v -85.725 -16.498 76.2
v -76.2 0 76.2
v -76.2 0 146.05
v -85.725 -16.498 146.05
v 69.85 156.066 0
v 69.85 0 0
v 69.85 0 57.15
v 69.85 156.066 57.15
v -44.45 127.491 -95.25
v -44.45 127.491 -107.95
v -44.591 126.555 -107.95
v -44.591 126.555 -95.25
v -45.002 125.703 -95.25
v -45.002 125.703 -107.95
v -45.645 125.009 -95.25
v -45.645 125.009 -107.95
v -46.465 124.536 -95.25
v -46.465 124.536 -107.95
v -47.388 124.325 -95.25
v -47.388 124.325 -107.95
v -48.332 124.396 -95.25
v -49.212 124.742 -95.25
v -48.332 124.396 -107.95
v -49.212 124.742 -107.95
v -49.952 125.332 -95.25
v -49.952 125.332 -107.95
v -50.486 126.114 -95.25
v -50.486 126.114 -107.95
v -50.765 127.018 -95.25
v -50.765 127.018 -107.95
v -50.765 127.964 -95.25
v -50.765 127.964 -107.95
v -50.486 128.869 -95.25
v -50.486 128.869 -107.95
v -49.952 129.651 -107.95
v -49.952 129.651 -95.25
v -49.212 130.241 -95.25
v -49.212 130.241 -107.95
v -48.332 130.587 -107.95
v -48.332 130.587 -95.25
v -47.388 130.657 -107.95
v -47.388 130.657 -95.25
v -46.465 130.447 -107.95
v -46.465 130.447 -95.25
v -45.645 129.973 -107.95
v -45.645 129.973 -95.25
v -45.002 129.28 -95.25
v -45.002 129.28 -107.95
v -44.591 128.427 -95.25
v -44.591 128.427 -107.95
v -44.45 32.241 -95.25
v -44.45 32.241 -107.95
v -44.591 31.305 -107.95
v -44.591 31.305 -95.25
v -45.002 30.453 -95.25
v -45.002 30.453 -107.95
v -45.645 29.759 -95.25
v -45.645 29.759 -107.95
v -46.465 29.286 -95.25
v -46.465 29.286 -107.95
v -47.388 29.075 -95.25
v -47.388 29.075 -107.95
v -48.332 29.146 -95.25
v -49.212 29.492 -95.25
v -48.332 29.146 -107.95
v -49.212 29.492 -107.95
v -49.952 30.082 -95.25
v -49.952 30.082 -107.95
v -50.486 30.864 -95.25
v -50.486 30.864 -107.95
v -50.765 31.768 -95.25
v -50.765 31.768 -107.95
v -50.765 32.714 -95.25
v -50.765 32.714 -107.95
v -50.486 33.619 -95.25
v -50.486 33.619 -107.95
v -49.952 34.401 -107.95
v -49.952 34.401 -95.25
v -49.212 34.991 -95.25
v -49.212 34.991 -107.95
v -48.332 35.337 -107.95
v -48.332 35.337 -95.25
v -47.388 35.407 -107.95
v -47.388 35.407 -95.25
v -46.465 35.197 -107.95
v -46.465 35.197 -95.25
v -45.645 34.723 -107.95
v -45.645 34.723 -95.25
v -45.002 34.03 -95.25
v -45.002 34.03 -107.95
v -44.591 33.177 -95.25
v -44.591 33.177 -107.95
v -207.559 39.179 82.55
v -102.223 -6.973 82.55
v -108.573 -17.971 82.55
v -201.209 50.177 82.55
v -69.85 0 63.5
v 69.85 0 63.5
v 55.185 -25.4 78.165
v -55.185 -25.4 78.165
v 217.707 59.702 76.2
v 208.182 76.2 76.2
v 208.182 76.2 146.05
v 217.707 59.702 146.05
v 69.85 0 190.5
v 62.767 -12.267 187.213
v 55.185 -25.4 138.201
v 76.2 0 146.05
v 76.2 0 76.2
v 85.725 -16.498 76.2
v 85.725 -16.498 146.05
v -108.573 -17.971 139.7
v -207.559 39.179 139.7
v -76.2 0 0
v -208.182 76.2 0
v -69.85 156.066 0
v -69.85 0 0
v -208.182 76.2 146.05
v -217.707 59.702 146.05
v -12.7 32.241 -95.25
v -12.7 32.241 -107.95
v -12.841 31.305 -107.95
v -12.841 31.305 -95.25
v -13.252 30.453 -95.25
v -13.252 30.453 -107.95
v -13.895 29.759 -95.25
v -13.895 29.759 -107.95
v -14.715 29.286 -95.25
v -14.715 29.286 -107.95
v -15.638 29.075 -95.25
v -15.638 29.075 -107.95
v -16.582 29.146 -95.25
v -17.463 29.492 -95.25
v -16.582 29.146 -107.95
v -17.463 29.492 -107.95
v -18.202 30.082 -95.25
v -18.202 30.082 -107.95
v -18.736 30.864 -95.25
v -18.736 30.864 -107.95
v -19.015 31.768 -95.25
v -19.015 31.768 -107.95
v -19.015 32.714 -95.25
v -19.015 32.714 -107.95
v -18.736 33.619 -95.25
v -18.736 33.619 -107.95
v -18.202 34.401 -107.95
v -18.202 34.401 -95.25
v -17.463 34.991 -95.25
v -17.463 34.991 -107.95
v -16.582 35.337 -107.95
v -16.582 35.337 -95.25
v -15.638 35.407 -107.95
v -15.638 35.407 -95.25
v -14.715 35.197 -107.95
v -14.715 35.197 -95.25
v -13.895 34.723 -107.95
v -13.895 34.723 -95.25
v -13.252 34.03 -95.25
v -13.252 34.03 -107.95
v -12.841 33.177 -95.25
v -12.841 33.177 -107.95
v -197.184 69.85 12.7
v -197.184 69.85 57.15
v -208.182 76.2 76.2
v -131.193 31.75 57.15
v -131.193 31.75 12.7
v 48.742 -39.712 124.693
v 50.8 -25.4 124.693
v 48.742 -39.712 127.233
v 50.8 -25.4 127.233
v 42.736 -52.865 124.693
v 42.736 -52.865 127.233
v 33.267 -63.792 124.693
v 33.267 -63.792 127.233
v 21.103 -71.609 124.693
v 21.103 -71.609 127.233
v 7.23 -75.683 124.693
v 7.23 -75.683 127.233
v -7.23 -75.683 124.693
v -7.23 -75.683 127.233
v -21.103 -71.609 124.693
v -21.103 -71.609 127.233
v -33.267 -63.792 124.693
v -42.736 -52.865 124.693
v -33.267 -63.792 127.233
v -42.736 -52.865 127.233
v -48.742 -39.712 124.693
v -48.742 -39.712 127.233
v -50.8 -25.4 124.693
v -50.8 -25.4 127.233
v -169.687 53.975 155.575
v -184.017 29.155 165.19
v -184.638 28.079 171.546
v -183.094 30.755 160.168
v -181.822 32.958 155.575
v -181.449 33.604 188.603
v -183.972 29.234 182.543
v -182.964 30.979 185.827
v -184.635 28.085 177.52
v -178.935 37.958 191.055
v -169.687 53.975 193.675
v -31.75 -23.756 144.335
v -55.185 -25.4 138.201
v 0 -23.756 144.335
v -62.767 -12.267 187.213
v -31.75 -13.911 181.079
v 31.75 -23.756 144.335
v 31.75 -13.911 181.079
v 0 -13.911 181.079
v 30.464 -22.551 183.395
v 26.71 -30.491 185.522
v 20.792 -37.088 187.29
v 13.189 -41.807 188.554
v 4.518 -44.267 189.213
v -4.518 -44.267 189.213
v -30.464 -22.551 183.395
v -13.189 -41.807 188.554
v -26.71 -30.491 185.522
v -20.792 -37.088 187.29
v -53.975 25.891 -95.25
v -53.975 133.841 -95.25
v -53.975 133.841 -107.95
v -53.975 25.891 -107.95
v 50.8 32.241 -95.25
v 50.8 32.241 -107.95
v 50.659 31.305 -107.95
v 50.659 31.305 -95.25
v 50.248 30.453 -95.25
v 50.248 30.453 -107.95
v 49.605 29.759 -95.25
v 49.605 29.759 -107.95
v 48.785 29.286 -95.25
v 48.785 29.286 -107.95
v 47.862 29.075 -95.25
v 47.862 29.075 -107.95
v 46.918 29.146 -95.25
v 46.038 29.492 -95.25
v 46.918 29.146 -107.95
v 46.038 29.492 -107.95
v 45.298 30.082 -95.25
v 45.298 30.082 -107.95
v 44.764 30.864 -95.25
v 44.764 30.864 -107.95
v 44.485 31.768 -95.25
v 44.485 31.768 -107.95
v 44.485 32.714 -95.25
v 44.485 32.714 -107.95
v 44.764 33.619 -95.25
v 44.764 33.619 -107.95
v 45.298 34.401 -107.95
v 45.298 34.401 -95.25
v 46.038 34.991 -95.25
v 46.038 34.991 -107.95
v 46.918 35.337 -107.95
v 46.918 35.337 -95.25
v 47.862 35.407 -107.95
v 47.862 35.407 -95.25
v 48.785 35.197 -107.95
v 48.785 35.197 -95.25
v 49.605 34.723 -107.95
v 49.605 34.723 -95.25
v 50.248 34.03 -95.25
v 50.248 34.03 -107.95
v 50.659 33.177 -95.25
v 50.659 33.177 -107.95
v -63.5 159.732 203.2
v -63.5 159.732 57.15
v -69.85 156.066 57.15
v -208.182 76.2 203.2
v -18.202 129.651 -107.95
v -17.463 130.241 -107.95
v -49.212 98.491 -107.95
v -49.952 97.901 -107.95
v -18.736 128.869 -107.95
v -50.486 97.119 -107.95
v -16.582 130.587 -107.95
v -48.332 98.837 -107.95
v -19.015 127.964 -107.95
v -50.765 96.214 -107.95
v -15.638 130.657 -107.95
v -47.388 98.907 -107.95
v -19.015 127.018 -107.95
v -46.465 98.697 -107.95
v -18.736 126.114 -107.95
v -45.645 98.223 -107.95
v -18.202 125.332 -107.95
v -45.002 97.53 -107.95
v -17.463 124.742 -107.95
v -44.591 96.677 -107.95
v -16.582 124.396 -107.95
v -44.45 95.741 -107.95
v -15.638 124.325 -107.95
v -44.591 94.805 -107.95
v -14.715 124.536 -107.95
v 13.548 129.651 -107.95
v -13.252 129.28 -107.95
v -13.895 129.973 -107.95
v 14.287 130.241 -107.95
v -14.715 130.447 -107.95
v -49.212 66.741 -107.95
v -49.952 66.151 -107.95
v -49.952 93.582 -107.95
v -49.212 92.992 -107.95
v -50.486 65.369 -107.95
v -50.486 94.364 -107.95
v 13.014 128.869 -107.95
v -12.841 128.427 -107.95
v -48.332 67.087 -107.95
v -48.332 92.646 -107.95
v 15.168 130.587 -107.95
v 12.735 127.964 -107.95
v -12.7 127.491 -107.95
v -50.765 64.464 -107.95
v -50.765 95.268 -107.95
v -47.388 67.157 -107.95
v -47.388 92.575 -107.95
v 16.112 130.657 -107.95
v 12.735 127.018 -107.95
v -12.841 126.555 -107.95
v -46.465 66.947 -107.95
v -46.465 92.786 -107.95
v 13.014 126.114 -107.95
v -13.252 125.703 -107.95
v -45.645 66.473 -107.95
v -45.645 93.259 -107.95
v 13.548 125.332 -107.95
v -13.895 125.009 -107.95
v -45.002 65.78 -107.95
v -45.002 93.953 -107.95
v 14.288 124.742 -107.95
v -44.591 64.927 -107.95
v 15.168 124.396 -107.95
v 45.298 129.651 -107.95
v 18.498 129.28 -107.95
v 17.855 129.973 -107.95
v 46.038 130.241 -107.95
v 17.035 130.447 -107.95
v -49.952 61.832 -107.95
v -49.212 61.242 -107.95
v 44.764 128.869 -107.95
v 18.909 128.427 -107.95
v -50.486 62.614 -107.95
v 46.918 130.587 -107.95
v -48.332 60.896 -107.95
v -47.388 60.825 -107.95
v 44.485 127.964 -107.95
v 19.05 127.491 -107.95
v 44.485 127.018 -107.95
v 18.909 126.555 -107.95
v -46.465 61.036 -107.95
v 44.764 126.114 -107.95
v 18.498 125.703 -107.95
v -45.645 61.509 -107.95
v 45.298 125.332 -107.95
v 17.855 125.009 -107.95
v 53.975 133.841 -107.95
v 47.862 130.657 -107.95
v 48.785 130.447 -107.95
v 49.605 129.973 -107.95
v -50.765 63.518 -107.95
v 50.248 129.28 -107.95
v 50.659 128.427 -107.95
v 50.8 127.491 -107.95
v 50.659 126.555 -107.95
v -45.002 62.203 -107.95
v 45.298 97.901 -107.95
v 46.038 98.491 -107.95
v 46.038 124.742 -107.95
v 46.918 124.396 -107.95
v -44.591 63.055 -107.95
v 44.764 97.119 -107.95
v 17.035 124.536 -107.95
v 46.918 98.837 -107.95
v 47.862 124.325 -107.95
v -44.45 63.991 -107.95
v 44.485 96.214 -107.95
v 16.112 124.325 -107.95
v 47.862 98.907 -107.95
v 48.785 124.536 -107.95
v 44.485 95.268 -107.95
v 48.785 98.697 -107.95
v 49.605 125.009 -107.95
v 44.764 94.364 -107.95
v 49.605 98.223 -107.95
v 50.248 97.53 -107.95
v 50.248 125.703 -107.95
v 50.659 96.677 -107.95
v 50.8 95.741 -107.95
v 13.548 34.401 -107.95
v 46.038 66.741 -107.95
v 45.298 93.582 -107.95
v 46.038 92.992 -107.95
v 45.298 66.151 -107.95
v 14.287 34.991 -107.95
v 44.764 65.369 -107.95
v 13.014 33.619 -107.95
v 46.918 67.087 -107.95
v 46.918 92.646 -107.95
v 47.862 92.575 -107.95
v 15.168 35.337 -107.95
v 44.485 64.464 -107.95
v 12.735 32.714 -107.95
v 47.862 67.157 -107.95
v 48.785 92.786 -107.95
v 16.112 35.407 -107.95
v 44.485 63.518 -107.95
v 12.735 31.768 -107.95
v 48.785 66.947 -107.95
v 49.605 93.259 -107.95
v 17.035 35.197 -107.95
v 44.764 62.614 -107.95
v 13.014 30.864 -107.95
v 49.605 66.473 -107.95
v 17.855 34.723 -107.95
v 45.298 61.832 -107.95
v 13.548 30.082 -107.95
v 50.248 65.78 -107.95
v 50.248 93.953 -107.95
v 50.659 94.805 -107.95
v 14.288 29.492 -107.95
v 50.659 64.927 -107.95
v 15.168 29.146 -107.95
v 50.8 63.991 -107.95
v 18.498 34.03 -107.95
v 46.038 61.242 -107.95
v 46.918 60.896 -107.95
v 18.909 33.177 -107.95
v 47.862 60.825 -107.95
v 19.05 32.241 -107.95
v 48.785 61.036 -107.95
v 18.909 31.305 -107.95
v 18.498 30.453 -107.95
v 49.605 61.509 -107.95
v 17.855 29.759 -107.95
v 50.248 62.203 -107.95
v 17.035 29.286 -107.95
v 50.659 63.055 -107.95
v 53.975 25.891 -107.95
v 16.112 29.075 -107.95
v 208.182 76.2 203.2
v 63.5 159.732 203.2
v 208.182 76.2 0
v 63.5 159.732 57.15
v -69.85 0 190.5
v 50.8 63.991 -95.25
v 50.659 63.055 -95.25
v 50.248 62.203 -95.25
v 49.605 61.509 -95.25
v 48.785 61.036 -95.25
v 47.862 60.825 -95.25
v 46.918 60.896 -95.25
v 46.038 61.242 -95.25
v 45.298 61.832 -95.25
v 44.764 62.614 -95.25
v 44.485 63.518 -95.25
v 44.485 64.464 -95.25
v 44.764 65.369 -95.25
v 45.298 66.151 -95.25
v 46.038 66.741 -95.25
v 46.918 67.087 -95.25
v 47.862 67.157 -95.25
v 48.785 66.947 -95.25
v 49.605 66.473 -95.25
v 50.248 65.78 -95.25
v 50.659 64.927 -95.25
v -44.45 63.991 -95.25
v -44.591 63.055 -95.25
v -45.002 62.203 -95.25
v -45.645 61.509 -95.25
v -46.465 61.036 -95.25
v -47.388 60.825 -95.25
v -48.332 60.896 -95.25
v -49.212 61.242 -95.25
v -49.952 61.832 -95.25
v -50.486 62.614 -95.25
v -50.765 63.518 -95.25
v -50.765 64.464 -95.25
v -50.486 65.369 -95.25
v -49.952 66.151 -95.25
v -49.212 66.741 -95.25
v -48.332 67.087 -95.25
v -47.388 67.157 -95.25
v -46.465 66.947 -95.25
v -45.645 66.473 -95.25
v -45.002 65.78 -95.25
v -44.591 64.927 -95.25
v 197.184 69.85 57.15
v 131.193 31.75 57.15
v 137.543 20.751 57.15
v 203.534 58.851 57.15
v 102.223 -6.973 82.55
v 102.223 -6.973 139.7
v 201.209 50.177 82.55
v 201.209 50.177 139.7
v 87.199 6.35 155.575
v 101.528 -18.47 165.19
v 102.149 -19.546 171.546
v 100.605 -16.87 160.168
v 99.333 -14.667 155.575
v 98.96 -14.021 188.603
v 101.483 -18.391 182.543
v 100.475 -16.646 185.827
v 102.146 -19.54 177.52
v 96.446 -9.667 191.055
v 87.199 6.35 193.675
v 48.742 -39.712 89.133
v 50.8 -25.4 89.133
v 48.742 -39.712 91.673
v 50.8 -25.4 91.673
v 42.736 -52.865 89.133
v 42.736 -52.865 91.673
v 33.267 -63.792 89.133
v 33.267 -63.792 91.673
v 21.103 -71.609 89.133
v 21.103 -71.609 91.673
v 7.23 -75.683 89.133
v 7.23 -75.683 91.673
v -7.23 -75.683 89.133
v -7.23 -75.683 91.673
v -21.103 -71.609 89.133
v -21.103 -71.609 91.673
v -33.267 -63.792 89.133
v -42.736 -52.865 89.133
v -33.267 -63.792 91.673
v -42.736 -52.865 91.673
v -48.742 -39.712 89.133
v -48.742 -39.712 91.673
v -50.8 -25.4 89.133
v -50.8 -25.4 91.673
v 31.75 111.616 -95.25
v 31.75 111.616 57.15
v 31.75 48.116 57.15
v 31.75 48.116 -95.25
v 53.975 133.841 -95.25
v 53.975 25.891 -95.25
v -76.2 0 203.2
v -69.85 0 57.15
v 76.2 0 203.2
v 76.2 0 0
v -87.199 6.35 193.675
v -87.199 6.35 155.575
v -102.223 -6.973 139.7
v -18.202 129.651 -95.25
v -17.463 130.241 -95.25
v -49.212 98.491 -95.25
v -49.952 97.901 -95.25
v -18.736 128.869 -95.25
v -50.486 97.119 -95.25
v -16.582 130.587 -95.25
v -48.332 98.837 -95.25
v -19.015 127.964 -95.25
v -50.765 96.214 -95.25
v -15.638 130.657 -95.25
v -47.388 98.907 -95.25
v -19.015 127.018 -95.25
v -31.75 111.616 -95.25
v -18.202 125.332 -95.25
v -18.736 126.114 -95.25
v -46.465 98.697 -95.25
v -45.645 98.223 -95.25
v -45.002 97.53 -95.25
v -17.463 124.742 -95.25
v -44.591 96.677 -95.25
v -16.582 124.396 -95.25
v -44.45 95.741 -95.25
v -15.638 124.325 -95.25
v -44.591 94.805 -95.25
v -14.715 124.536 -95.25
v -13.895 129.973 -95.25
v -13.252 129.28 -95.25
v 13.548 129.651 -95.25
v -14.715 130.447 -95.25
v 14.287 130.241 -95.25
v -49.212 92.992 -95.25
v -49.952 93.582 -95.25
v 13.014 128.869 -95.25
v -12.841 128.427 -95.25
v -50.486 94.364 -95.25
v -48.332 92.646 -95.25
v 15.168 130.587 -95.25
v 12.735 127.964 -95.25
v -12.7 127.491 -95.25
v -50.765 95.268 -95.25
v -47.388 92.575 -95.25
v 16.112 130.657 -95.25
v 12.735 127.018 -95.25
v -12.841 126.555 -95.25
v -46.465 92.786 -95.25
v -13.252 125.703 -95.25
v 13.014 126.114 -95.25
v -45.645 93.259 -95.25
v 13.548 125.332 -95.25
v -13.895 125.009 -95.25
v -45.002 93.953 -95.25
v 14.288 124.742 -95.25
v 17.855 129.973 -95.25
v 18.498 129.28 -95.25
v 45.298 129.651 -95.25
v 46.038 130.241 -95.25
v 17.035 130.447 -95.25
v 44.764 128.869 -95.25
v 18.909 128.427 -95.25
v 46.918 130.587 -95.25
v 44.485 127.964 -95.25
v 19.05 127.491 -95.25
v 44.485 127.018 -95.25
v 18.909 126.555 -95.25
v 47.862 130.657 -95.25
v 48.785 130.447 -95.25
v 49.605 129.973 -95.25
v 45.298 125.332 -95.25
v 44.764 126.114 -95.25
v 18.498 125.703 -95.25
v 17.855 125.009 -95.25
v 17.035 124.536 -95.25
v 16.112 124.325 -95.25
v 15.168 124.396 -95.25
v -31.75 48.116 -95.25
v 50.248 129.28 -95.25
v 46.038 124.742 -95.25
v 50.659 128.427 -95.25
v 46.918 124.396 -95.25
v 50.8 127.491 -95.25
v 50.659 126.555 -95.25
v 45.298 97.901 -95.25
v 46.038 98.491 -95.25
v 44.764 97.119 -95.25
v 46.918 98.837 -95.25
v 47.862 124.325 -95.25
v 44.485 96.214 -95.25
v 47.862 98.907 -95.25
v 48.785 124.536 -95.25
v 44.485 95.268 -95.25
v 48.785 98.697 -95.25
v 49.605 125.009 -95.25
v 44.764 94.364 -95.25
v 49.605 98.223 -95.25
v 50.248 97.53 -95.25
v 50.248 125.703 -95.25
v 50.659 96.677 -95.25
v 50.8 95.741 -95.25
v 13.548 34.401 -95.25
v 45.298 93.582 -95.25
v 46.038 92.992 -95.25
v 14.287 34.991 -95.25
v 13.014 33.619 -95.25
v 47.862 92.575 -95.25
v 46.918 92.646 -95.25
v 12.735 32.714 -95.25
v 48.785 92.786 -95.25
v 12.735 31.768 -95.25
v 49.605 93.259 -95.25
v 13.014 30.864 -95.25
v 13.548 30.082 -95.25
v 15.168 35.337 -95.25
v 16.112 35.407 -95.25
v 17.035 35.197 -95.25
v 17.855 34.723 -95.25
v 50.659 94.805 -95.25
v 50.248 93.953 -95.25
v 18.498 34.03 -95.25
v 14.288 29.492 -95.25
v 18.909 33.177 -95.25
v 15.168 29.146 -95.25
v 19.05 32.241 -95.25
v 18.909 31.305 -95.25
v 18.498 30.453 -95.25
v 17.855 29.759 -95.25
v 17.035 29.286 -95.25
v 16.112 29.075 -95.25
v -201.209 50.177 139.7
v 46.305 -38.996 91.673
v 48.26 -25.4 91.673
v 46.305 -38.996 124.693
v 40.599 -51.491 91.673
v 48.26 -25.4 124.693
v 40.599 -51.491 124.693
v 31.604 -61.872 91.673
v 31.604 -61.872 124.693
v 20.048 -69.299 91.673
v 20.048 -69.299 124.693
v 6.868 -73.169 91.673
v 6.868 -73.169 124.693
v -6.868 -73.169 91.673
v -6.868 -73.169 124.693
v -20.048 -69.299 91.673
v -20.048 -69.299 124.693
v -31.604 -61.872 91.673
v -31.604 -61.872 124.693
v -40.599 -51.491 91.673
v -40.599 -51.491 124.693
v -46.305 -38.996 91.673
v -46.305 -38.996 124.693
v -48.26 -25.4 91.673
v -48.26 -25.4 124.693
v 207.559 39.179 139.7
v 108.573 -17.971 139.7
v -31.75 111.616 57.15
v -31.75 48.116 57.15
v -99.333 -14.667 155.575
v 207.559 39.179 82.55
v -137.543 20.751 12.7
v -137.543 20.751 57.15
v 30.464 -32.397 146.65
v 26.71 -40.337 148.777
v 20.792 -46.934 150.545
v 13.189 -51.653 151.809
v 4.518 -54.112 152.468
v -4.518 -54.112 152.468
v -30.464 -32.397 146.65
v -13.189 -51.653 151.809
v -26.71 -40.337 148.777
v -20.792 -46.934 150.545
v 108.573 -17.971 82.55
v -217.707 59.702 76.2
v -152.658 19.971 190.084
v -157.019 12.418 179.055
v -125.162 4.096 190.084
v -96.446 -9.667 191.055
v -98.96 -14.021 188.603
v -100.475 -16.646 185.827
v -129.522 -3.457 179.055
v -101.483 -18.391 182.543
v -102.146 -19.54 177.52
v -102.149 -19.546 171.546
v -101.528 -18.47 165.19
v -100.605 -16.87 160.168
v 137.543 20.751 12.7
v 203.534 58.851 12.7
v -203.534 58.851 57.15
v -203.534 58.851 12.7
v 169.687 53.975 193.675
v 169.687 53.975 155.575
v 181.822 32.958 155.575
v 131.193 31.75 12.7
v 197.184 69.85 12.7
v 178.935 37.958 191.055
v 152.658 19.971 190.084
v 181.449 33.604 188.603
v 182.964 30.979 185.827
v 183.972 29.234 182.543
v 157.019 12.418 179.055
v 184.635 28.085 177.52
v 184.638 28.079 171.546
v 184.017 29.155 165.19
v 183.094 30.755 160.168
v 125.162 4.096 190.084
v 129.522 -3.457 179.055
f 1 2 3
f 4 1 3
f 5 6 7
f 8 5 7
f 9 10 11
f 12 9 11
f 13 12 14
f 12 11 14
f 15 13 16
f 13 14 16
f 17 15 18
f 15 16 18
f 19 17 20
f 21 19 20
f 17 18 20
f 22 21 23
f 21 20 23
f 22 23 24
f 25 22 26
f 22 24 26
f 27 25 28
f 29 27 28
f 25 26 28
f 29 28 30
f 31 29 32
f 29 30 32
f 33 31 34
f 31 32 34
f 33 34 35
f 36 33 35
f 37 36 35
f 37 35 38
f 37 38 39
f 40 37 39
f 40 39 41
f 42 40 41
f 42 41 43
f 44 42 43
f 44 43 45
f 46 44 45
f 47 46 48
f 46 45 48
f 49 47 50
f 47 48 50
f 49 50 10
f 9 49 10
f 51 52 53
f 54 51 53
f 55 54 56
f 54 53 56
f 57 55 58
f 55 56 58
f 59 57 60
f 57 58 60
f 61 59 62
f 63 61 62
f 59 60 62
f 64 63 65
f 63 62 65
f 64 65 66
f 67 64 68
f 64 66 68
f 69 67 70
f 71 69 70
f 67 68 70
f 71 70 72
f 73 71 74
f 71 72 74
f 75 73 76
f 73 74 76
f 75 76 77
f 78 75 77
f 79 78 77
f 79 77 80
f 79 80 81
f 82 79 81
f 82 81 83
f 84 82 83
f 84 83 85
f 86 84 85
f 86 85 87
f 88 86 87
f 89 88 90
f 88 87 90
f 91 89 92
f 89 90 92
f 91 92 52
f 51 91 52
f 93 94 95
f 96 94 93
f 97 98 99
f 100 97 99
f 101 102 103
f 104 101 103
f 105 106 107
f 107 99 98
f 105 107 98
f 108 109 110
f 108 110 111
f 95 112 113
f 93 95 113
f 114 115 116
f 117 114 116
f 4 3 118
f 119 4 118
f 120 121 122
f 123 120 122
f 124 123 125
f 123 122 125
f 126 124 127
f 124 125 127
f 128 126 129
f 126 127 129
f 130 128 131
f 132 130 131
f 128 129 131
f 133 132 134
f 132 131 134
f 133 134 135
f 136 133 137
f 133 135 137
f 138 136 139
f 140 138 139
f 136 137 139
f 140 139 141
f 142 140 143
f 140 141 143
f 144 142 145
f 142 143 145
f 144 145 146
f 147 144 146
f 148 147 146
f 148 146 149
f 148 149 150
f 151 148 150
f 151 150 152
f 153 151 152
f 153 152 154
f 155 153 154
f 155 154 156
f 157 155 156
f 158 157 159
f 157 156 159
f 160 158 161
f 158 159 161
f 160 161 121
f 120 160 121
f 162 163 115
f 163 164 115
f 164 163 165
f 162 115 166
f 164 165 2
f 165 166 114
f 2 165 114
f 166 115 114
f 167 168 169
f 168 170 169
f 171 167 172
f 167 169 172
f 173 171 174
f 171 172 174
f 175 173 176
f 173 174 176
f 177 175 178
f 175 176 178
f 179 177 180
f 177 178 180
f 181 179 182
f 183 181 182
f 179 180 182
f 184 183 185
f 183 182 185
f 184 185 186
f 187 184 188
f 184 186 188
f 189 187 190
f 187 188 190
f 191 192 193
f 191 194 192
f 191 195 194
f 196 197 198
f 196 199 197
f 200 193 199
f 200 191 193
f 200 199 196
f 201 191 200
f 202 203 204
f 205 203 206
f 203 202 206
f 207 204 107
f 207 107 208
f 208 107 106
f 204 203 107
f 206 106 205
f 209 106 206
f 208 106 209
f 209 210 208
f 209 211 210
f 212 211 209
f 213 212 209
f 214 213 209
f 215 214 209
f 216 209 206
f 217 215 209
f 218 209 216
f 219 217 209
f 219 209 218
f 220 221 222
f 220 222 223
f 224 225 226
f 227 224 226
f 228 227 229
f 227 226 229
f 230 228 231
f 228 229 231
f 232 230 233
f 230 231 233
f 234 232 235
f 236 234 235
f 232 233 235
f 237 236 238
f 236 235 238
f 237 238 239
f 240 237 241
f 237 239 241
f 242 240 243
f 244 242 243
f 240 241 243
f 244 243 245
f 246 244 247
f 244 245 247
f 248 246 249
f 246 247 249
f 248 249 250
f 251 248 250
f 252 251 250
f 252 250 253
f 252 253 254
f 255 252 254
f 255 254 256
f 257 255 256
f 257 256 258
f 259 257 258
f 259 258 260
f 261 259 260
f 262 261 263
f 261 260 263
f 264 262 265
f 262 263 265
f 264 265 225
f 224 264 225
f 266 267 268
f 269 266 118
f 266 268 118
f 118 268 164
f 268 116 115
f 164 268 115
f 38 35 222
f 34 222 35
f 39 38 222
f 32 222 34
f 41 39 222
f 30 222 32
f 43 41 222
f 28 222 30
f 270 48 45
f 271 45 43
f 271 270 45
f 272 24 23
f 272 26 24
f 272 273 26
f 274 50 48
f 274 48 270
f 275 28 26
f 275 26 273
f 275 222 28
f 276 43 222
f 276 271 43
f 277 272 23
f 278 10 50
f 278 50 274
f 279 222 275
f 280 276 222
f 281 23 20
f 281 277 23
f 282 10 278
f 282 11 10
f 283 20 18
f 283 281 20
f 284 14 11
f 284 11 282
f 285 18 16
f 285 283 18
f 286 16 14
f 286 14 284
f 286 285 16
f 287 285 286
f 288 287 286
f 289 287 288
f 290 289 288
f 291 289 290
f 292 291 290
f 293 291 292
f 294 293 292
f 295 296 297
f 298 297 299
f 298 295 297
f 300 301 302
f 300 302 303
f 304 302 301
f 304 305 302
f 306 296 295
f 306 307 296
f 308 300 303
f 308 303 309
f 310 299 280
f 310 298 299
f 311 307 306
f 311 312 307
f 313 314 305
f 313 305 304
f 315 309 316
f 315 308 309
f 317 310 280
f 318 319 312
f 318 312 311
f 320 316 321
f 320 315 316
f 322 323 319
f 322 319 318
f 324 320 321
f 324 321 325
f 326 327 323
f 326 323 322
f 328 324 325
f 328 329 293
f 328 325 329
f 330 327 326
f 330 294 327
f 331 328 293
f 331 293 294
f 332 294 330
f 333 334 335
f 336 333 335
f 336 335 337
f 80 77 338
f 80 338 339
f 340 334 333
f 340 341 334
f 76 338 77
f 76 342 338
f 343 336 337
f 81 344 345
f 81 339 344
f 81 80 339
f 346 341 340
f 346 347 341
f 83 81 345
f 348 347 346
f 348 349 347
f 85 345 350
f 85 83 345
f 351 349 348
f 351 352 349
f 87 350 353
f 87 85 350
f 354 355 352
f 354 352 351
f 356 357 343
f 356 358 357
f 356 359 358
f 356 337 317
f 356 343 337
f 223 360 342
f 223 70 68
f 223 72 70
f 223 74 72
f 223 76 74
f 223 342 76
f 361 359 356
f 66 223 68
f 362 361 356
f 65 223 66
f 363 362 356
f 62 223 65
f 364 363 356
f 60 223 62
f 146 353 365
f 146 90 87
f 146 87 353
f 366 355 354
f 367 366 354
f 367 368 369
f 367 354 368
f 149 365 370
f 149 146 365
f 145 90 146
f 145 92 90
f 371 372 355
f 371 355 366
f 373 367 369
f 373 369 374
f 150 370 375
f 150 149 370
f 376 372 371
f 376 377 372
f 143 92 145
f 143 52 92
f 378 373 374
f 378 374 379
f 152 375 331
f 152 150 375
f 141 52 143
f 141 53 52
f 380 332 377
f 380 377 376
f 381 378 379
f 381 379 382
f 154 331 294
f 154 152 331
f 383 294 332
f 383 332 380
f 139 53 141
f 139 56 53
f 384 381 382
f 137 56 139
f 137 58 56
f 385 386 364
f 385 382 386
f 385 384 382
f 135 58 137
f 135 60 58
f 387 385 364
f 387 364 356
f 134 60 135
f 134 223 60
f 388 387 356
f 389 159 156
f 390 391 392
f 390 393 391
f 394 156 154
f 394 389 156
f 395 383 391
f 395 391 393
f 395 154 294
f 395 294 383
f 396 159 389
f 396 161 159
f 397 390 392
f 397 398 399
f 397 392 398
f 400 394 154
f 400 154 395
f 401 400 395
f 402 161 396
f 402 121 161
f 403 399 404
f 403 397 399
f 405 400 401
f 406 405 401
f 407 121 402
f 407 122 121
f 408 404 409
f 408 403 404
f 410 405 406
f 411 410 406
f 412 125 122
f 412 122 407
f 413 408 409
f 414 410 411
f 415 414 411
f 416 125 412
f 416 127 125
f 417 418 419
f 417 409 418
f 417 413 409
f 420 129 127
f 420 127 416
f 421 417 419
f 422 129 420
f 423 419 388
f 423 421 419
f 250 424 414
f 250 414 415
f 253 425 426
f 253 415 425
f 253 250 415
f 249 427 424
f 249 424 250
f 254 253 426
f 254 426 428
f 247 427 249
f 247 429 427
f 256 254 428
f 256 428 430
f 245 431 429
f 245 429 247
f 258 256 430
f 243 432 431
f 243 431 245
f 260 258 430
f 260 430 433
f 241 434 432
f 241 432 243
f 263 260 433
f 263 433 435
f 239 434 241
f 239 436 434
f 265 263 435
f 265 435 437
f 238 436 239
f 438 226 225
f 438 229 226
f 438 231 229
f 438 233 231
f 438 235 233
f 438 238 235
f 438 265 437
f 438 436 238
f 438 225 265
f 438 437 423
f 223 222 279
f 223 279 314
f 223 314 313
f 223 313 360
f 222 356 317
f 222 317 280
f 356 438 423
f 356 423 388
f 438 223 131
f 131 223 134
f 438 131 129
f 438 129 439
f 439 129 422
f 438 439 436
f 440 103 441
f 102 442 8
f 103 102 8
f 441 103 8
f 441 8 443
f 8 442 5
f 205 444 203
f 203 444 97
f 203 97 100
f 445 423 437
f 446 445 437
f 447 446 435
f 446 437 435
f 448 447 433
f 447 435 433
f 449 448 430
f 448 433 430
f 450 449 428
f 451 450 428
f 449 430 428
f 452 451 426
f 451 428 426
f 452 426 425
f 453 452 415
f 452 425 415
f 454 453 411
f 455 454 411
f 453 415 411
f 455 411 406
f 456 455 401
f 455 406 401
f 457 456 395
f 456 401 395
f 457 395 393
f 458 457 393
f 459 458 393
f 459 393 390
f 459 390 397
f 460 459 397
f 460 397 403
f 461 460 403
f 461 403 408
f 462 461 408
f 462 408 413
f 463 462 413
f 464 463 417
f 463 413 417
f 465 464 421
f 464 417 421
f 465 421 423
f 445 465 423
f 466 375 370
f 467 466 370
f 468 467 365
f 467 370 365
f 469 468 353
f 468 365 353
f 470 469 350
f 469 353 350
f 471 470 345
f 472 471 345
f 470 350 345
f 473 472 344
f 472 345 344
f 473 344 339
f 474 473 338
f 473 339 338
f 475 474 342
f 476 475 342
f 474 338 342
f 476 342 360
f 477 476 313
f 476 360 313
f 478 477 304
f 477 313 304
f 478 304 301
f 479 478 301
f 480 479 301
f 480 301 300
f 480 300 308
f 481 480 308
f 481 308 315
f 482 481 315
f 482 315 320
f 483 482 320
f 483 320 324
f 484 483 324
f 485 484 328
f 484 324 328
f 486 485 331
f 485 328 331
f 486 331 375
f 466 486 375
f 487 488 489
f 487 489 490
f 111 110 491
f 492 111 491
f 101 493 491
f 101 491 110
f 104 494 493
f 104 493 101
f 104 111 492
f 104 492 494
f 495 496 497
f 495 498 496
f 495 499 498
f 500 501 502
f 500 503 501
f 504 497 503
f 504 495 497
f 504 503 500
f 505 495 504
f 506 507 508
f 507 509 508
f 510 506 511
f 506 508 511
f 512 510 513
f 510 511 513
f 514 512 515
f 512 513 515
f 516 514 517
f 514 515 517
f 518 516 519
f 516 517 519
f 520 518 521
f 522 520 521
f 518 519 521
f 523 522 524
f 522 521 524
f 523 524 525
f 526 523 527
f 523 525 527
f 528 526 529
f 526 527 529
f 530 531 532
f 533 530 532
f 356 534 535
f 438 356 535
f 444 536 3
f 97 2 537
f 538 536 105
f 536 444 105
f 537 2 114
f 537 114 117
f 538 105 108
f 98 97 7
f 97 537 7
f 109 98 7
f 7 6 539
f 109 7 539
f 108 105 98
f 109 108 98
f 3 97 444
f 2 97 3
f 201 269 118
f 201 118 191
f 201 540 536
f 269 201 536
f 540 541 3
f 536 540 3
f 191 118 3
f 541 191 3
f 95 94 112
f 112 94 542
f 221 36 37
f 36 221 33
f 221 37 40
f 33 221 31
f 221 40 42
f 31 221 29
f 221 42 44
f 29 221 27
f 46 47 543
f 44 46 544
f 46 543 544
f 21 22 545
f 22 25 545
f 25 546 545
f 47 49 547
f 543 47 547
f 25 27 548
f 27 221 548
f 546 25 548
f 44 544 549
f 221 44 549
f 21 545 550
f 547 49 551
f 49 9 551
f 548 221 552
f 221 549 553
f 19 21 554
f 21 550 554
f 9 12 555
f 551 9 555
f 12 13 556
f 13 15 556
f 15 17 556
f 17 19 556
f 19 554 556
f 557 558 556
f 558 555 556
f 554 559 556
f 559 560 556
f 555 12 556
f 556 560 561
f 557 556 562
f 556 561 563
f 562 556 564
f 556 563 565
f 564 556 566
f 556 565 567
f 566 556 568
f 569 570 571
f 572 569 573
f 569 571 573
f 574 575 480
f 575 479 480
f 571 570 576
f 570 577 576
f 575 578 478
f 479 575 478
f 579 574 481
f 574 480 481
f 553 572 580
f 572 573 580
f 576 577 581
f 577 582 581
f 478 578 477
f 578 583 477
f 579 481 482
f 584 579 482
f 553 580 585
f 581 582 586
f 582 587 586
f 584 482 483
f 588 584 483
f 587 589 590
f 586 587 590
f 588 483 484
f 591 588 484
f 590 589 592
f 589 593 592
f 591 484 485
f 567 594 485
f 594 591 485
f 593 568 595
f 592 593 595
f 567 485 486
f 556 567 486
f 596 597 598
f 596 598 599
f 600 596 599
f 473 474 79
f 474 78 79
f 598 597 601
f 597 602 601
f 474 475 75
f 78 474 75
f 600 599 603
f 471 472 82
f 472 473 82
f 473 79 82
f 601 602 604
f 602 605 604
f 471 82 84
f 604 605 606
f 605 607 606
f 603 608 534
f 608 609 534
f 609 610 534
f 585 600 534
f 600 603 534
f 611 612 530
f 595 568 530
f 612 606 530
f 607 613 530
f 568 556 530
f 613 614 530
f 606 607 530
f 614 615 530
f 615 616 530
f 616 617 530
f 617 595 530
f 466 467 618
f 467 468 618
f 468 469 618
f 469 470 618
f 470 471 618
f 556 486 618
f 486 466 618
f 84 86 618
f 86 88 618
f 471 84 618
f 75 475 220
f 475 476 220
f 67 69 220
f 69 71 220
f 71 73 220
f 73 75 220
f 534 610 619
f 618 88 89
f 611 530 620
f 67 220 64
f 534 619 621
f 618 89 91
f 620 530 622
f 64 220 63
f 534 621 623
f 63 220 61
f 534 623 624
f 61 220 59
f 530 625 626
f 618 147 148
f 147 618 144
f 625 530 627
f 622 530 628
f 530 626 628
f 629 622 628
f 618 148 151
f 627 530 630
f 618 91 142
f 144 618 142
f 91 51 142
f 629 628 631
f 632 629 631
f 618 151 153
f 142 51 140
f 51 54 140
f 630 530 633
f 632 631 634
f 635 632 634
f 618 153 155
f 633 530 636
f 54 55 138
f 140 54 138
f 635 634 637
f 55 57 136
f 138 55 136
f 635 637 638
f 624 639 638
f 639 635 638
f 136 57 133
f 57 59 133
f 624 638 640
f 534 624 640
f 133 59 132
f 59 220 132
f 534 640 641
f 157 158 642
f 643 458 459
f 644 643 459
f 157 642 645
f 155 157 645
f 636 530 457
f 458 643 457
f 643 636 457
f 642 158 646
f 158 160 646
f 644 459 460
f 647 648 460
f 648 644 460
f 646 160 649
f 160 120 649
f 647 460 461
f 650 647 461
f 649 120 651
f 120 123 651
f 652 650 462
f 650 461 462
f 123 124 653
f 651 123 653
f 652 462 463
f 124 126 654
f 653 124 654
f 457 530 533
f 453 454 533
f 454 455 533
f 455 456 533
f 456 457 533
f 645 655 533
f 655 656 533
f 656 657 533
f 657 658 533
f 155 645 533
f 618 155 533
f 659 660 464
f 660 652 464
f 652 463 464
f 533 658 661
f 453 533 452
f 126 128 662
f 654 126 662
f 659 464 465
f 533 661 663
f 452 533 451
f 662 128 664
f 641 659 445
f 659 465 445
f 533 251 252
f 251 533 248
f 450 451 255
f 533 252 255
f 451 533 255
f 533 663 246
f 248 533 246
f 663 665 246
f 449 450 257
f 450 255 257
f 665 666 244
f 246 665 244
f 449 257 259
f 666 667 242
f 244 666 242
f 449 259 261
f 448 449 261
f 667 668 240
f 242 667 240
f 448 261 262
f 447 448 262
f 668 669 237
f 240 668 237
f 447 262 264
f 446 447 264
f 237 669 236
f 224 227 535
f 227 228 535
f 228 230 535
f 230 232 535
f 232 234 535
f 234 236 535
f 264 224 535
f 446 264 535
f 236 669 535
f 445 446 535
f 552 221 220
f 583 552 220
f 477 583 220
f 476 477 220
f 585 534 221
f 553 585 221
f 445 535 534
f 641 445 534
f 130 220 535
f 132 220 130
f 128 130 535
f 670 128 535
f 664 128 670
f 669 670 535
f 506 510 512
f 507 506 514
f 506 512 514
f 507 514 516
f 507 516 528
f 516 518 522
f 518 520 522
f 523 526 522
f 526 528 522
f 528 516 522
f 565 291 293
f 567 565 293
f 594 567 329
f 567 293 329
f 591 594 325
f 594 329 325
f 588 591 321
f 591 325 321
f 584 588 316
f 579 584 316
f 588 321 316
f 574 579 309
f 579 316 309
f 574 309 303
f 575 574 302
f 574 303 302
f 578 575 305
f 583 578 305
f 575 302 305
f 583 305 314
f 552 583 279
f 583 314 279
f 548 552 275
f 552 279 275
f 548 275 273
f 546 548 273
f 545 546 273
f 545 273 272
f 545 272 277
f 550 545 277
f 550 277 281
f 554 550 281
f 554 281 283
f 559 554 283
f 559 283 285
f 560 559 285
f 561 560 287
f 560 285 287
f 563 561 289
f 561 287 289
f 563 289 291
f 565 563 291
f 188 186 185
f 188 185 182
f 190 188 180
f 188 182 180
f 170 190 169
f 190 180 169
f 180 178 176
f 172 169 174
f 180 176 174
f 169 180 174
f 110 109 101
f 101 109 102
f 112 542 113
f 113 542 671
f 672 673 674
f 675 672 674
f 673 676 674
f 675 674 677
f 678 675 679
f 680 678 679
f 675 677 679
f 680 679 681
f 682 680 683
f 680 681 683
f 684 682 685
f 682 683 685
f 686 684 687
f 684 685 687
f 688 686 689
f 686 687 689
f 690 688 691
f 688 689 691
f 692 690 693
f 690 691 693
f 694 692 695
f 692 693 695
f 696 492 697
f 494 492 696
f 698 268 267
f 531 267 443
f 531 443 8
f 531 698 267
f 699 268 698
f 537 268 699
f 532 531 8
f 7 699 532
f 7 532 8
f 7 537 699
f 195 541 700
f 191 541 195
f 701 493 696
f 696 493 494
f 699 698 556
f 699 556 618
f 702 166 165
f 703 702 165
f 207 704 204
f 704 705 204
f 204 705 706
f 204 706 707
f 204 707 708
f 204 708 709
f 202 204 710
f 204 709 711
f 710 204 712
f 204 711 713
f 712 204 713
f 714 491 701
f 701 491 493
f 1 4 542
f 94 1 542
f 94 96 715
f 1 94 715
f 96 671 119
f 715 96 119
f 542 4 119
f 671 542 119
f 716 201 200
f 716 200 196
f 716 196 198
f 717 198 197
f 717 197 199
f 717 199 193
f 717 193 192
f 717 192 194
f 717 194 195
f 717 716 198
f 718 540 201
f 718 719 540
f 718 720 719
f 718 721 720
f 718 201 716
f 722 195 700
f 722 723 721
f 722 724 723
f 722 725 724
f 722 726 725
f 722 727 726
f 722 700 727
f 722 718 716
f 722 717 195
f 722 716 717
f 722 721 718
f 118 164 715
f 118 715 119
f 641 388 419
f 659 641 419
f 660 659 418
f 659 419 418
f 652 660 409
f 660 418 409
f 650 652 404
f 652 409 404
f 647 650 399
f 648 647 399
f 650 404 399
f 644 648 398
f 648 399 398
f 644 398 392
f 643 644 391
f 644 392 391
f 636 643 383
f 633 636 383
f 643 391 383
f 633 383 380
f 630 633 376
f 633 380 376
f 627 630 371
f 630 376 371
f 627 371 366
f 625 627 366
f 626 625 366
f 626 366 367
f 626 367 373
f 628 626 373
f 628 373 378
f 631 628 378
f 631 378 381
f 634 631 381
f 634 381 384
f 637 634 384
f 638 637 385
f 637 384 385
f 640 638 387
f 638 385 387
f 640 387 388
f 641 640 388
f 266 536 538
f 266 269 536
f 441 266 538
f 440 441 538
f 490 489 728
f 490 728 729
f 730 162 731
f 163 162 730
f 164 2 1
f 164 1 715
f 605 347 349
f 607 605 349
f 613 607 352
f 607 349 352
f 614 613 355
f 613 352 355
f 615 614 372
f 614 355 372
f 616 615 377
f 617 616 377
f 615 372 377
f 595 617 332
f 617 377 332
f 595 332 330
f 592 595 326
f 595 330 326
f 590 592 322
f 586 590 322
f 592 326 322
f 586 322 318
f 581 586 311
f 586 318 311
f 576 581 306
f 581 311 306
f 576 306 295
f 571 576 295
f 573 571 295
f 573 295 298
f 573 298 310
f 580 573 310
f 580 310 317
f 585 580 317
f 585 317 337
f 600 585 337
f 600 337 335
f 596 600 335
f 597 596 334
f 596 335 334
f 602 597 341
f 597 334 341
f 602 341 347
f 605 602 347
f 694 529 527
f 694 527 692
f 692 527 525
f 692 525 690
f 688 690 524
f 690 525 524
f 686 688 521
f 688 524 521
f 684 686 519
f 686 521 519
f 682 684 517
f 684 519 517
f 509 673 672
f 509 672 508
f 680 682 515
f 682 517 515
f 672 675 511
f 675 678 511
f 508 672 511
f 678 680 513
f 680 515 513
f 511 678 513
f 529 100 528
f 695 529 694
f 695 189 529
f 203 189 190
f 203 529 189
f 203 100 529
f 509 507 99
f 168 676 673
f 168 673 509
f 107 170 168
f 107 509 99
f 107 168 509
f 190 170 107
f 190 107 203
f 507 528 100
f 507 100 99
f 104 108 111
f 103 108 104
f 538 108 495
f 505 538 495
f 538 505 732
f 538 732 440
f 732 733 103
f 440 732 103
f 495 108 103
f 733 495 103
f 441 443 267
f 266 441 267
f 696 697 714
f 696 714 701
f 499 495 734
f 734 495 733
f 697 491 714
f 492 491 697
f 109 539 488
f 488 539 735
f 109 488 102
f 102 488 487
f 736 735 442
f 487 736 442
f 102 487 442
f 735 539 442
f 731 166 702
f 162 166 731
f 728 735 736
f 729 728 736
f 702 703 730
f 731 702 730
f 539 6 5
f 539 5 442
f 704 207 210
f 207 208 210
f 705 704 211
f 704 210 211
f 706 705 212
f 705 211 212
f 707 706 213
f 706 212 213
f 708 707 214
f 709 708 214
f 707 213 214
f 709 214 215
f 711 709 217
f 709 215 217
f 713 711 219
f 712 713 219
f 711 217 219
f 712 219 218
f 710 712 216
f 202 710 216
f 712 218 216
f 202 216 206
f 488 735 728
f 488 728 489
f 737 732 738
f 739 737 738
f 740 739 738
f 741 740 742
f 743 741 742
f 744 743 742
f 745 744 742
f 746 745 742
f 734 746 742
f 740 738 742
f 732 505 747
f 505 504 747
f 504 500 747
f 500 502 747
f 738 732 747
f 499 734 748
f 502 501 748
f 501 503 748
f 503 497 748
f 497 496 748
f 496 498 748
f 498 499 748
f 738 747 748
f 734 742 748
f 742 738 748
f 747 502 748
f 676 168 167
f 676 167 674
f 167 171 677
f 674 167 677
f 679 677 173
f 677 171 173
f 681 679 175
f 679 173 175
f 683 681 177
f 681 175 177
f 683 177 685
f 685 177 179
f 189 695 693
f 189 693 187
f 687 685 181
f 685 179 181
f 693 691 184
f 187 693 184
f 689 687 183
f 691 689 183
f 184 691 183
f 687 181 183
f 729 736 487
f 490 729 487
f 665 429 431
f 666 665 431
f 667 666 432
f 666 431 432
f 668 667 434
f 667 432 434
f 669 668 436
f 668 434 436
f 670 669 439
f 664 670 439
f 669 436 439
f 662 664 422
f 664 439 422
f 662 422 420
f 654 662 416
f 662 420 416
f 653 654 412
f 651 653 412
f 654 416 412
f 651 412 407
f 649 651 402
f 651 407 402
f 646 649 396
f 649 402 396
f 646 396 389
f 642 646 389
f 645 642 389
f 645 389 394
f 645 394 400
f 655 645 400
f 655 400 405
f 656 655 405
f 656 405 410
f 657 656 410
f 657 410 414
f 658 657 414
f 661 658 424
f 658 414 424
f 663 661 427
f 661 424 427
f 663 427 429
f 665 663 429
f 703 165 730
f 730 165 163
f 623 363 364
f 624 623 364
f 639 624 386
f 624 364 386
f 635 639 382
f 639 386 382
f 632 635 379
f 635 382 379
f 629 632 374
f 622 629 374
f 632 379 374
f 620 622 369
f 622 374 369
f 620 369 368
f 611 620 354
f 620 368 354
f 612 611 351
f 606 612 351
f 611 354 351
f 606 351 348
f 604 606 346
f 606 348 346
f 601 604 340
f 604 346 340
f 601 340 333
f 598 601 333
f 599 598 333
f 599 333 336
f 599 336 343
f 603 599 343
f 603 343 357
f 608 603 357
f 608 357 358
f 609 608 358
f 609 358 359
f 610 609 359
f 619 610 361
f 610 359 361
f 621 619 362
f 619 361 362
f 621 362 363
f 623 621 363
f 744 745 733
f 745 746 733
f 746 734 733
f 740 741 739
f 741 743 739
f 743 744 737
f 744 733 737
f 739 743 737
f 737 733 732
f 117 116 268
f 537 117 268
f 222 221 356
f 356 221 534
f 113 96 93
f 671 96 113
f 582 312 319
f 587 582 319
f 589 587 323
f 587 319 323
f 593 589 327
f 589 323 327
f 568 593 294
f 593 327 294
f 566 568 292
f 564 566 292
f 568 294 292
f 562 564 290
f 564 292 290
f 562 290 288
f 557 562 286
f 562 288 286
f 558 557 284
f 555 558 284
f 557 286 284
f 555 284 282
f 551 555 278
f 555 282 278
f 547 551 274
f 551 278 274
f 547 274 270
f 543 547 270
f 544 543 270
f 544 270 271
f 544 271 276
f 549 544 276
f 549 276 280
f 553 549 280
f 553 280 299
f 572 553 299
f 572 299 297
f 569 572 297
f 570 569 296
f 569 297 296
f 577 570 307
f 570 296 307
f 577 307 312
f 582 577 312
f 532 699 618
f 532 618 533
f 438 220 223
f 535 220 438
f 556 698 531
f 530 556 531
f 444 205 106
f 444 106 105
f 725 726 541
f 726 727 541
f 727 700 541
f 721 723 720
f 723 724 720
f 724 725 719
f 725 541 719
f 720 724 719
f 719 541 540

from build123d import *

# Parameters (mm, degrees)
F1_DEPTH  = 203.2
F2_W      = 76.2
F2_H      = 44.45
F3_DEPTH  = 12.7
F4_W      = 152.4
F4_H      = 69.85
F5_DEPTH  = 19.05
F6_W      = 114.3
F6_H      = 57.15
F7_DEPTH  = 12.7
F8_W      = 95.25
F8_H      = 38.1
F9_DEPTH  = 31.75
F11_DEPTH = 95.25
F12_W     = 139.7
F12_H     = 127
F13_DEPTH = 25.4
F15_DEPTH = 127
F17_DEPTH = 76.2
F19_ANGLE = 180
F20_W     = 31.75
F20_H     = 38.0410186947
F21_ANGLE = 180
F22_W     = 139.7
F22_H     = 57.15
F23_DEPTH = 159.7323484187
F25_W     = 63.5
F25_H     = 63.5
F26_DEPTH = 152.4
F27_W     = 107.95
F27_H     = 107.95
F28_DEPTH = 12.7
F29_R     = 3.175
F30_DEPTH = 12.7


with BuildPart() as f1:
    # F0 (on Top) → F1 (new body)
    with BuildSketch(Plane.XY):
        Polygon((-76.2, 0), (0, 0), (76.2, 0), (208.1822715367, 76.2), (63.5, 159.7323484187), (0, 159.7323484187), (-63.5, 159.7323484187), (-208.1822715367, 76.2), align=None)
    extrude(amount=F1_DEPTH)

    # F2 (on face) → F3 (join)
    with BuildSketch(Plane(origin=(19.05, -32.9955678842, 0), x_dir=(0.8660254038, 0.5, 0), z_dir=(0.5, -0.8660254038, 0))):
        with Locations((167.5911357684, 34.925)):
            Rectangle(F2_W, F2_H)
    extrude(amount=F3_DEPTH)

    # F4 (on face) → F5 (join)
    with BuildSketch(Plane(origin=(19.05, -32.9955678842, 0), x_dir=(0.8660254038, 0.5, 0), z_dir=(0.5, -0.8660254038, 0))):
        with Locations((142.1911357684, 111.125)):
            Rectangle(F4_W, F4_H)
    extrude(amount=F5_DEPTH)

    # F6 (on face) → F7 (join)
    with BuildSketch(Plane(origin=(28.575, -49.4933518263, 0), x_dir=(0.8660254038, 0.5, 0), z_dir=(0.5, -0.8660254038, 0))):
        with Locations((142.1911357684, 111.125)):
            Rectangle(F6_W, F6_H)
    extrude(amount=F7_DEPTH)

    # F8 (on face) → F9 (join)
    with BuildSketch(Plane(origin=(19.05, -32.9955678842, 0), x_dir=(0.8660254038, 0.5, 0), z_dir=(0.5, -0.8660254038, 0))):
        with Locations((126.3161357684, 174.625)):
            Rectangle(F8_W, F8_H)
    extrude(amount=F9_DEPTH)

    # F10 (on face) → F11 (cut, through all)
    with BuildSketch(Plane(origin=(68.1485226281, 39.3455678842, 0), x_dir=(0.5, -0.8660254038, 0), z_dir=(-0.8660254038, -0.5, 0))):
        with BuildLine():
            Line((69.85, 193.675), (38.1, 193.675))
            add(Edge.make_bspline(
                [(38.1, 193.675), (45.3948823455, 193.2153032956), (59.8621743056, 192.3554471638), (70.7391260405, 179.5930154775), (66.9907434886, 162.4530172158), (62.3683556914, 155.575)],
                knots=[0, 0, 0, 0, 0.3473900959, 0.6300376929, 1, 1, 1, 1], degree=3))
            Line((62.3683556914, 155.575), (69.85, 155.575))
            Line((69.85, 155.575), (69.85, 193.675))
        make_face()
    extrude(amount=-F11_DEPTH, mode=Mode.SUBTRACT)

    # F12 (on face) → F13 (join)
    with BuildSketch(Plane.XZ):
        with Locations((0, 127)):
            Rectangle(F12_W, F12_H)
    extrude(amount=F13_DEPTH)

    # F14 (on face) → F15 (cut, through all)
    with BuildSketch(Plane(origin=(0, 0, 63.5), x_dir=(1, 0, 0), z_dir=(0, 0, -1))):
        Polygon((69.85, 0), (69.85, 25.4), (55.1853031626, 25.4), align=None)
        Polygon((-69.85, 25.4), (-69.85, 0), (-55.1853031626, 25.4), align=None)
    extrude(amount=-F15_DEPTH, mode=Mode.SUBTRACT)

    # F16 (on Right) → F17 (cut, symmetric)
    with BuildSketch(Plane.YZ):
        Polygon((-25.4, 63.5), (0, 63.5), (-25.4, 78.1646968374), align=None)
        Polygon((-25.4, 190.5), (-25.4, 138.2009377176), (-12.2672579939, 187.2129981271), (0, 190.5), align=None)
    extrude(amount=F17_DEPTH, both=True, mode=Mode.SUBTRACT)

    # F18 (on face) → F19 (revolve)
    with BuildSketch(Plane.XZ.offset(25.4)):
        Polygon((50.8, 127.2328172775), (0, 127.2328172775), (0, 89.1328172775), (50.8, 89.1328172775), (50.8, 91.6728172775), (48.26, 91.6728172775), (48.26, 124.6928172775), (50.8, 124.6928172775), align=None)
    revolve(axis=Axis((0, -25.4, 108.1828172775), (0, 0, -1)), revolution_arc=F19_ANGLE)

    # F20 (on face) → F21 (revolve)
    with BuildSketch(Plane(origin=(0, -58.2487570575, 15.6077074137), x_dir=(1, 0, 0), z_dir=(0, -0.9659258263, 0.2588190451))):
        with Locations((15.875, 152.2883605606)):
            Rectangle(F20_W, F20_H)
    revolve(axis=Axis((0, -18.8336289969, 162.7069679224), (0, -0.2588190451, -0.9659258263)), revolution_arc=F21_ANGLE)

    # F22 (on face) → F23 (cut, through all)
    with BuildSketch(Plane.XZ):
        with Locations((0, 28.575)):
            Rectangle(F22_W, F22_H)
    extrude(amount=-F23_DEPTH, mode=Mode.SUBTRACT)

    # F24: F1 across plane


with BuildPart() as f1_1:
    add(f1.part)
    add(f1.part.mirror(Plane.YZ))

    # F25 (on face) → F26 (join)
    with BuildSketch(Plane(origin=(0, 0, 57.15), x_dir=(1, 0, 0), z_dir=(0, 0, -1))):
        with Locations((0, -79.8661742093)):
            Rectangle(F25_W, F25_H)
    extrude(amount=F26_DEPTH)

    # F27 (on face) → F28 (join)
    with BuildSketch(Plane(origin=(0, 0, -95.25), x_dir=(1, 0, 0), z_dir=(0, 0, -1))):
        with Locations((0, -79.8661742093)):
            Rectangle(F27_W, F27_H)
    extrude(amount=F28_DEPTH)

    # F29 (on face) → F30 (cut, through all)
    with BuildSketch(Plane(origin=(0, 0, -107.95), x_dir=(1, 0, 0), z_dir=(0, 0, -1))):
        with Locations((-47.625, -32.2411742093)):
            Circle(F29_R)
        with Locations((-47.625, -63.9911742093)):
            Circle(F29_R)
        with Locations((-15.875, -32.2411742093)):
            Circle(F29_R)
        with Locations((-47.625, -95.7411742093)):
            Circle(F29_R)
        with Locations((-47.625, -127.4911742093)):
            Circle(F29_R)
        with Locations((-15.875, -127.4911742093)):
            Circle(F29_R)
        with Locations((15.875, -32.2411742093)):
            Circle(F29_R)
        with Locations((47.625, -32.2411742093)):
            Circle(F29_R)
        with Locations((47.625, -63.9911742093)):
            Circle(F29_R)
        with Locations((47.625, -95.7411742093)):
            Circle(F29_R)
        with Locations((47.625, -127.4911742093)):
            Circle(F29_R)
        with Locations((15.875, -127.4911742093)):
            Circle(F29_R)
    extrude(amount=-F30_DEPTH, mode=Mode.SUBTRACT)


solid = f1_1.part
